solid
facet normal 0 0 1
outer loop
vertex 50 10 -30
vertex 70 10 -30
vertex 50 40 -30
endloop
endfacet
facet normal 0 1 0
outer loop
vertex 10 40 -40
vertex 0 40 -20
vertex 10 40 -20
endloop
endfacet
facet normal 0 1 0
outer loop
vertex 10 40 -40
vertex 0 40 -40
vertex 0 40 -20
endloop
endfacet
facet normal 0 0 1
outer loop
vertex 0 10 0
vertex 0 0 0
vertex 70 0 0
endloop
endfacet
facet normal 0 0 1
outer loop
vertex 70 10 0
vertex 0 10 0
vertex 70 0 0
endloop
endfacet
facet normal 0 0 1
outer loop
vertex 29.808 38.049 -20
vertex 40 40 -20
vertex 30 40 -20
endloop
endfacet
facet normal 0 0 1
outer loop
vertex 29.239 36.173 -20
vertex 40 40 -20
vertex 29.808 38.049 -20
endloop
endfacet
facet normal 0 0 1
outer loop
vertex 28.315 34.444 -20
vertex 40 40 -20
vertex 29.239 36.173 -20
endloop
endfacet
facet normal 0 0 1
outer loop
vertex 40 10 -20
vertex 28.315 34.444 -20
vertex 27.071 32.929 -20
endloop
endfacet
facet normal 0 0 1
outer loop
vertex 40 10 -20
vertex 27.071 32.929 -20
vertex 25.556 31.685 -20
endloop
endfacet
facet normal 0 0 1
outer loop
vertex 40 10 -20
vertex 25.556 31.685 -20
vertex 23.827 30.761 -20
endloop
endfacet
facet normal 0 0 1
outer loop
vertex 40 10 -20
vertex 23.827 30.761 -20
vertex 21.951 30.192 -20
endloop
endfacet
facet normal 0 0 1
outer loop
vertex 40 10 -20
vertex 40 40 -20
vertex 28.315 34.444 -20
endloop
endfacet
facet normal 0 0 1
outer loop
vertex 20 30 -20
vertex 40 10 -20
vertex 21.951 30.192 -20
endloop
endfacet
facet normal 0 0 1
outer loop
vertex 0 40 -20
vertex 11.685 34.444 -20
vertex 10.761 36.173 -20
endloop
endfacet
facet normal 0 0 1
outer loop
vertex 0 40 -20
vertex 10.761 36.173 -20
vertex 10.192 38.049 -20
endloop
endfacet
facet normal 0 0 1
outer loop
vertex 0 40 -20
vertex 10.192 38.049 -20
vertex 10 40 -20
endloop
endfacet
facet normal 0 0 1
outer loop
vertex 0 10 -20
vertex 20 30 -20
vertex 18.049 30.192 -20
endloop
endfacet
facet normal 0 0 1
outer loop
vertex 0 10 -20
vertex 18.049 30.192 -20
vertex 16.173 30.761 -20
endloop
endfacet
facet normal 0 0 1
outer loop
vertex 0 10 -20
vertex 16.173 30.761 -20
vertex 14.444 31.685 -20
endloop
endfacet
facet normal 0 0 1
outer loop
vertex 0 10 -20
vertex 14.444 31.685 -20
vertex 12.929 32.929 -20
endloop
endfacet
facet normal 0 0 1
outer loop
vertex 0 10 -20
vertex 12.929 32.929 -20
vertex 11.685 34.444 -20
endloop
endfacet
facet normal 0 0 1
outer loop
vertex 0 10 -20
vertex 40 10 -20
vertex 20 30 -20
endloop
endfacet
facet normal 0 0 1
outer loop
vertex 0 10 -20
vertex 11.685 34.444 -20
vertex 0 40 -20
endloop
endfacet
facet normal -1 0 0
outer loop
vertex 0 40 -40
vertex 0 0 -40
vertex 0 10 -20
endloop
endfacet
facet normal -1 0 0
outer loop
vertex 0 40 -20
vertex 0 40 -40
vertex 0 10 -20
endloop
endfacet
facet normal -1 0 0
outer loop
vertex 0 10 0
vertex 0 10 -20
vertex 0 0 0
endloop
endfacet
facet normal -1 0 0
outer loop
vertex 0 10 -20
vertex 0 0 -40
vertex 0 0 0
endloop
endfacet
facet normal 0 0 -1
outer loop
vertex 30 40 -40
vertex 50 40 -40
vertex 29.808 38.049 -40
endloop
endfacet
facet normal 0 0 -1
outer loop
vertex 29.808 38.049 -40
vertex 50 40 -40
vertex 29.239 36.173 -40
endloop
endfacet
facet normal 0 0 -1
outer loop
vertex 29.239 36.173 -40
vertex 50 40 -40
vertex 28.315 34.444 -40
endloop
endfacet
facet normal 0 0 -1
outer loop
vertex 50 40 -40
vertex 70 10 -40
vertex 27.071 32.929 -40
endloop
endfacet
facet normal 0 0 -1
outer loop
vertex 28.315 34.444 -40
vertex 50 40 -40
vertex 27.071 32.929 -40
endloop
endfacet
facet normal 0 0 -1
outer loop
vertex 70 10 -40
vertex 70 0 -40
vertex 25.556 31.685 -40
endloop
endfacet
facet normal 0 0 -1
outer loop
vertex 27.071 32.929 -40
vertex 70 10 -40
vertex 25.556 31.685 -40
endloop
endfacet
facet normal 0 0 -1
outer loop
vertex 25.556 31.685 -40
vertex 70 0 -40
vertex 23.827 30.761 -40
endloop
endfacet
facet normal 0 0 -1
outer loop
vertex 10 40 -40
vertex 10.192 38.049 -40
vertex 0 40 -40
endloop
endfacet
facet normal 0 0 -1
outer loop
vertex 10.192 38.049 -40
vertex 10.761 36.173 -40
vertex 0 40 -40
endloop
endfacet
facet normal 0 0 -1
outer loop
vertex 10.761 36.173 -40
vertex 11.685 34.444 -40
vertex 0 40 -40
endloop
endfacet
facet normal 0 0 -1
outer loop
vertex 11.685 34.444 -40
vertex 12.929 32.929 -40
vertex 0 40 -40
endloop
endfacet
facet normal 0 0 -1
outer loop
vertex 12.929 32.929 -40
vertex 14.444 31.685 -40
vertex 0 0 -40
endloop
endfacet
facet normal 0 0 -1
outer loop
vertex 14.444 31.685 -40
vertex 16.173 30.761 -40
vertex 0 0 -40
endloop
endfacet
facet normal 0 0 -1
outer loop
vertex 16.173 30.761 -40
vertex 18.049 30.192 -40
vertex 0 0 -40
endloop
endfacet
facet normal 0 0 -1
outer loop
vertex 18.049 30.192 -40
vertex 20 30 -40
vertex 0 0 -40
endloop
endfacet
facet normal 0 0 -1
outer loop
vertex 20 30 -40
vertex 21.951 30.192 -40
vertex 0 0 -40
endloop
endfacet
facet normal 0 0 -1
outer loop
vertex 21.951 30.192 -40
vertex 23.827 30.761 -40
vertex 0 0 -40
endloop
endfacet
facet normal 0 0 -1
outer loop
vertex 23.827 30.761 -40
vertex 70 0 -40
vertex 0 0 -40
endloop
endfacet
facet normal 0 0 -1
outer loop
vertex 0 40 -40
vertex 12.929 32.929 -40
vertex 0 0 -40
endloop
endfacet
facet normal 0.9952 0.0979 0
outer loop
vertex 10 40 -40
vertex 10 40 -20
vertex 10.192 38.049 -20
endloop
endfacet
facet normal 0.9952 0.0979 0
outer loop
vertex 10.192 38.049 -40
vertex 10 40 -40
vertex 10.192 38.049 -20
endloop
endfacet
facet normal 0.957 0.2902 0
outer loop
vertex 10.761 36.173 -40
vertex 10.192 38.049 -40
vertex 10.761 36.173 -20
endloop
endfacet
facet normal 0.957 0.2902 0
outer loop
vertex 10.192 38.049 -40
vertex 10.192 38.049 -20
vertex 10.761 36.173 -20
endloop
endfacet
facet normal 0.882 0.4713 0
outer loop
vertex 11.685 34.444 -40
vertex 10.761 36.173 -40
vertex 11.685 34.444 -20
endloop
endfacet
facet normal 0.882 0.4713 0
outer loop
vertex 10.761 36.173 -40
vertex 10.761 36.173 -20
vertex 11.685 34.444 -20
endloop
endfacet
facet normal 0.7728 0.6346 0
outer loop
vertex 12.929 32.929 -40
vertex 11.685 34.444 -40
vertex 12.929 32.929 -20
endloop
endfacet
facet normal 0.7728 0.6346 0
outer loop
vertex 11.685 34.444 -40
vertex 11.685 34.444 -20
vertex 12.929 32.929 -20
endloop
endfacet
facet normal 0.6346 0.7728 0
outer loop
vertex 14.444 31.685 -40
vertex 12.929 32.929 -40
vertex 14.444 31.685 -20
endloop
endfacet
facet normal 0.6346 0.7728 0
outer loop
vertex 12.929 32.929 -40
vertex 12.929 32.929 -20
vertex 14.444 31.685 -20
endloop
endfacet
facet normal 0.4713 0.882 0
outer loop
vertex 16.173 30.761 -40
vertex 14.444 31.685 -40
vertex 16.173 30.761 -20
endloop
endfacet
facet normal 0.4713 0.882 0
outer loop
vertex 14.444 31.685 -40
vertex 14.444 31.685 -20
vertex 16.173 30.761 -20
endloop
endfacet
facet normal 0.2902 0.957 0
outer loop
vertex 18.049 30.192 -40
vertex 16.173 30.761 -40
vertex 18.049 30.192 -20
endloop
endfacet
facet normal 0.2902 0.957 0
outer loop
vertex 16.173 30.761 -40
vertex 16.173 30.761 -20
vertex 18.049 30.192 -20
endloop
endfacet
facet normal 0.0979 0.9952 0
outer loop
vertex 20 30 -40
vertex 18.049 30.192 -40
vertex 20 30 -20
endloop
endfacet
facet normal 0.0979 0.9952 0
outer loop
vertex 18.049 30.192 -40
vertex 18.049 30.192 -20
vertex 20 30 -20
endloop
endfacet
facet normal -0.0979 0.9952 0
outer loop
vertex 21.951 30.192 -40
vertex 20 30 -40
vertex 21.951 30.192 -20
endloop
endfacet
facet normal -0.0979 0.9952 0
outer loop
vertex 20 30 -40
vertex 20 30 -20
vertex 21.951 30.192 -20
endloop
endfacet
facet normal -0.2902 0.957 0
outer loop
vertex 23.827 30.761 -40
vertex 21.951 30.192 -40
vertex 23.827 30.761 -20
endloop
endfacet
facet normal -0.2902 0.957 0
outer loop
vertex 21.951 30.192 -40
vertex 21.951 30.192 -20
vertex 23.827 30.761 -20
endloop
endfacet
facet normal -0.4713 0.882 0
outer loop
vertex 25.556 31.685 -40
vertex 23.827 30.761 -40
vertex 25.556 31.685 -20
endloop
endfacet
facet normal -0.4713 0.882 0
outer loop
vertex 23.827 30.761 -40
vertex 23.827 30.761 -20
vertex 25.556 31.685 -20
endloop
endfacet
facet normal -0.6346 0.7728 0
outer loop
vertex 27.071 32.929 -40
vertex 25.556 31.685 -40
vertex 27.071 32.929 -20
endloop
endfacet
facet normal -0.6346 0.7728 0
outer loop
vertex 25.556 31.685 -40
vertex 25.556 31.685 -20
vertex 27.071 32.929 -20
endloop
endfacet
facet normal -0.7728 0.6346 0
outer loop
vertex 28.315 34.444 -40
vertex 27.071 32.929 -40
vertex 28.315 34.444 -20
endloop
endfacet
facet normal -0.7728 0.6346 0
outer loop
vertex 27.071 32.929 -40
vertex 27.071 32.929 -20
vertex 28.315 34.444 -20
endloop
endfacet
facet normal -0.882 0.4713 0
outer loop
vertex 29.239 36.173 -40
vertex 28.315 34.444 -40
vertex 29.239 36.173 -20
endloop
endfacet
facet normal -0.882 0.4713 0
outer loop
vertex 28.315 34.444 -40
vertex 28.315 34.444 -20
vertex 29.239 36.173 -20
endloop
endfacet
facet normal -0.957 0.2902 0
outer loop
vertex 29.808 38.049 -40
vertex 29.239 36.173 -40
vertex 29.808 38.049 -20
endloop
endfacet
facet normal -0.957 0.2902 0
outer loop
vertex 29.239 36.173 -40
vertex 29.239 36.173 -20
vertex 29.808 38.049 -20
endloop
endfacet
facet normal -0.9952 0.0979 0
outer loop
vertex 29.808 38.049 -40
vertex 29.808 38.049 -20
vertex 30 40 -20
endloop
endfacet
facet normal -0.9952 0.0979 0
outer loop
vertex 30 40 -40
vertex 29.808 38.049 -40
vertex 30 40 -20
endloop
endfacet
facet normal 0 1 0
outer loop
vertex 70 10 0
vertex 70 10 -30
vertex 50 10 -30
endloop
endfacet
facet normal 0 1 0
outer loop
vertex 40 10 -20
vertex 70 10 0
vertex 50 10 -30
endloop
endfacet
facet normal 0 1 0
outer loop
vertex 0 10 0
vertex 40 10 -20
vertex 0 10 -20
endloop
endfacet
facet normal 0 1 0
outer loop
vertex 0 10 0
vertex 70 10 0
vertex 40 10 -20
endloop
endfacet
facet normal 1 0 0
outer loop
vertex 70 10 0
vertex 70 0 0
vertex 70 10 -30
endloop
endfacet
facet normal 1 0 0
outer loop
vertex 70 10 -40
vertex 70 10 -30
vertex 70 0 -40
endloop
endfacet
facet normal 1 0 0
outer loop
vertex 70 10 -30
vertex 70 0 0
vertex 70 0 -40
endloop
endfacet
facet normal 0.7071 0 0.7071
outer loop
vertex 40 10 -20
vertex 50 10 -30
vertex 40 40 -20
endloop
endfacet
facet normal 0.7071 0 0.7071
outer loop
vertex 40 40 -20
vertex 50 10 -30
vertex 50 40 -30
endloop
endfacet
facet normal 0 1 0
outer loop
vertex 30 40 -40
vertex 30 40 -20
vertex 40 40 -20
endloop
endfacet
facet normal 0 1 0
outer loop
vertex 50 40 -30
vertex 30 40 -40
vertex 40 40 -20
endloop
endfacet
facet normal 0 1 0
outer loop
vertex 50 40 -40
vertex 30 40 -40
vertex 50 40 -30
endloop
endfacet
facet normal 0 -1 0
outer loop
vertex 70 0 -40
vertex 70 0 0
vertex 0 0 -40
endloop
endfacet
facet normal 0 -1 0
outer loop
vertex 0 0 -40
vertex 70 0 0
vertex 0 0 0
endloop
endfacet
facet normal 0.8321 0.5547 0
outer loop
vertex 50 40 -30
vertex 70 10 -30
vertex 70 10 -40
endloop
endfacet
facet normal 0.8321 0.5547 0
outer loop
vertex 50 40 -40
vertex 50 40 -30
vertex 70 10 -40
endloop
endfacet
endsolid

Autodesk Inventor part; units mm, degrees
ref_plane "YZ Plane" through (0, 0, 0) normal (1, 0, 0) x (0, 1, 0)
ref_plane "XZ Plane" through (0, 0, 0) normal (0, 1, 0) x (-1, 0, 0)
ref_plane "XY Plane" through (0, 0, 0) normal (0, 0, 1) x (1, 0, 0)
sketch "草圖1" plane through (0, 0, 0) normal (0, 1, 0) x (-1, 0, 0)
  line L0 (0, 0) -> (-70, 0)
  line L1 (-70, 0) -> (-70, -40)
  line L2 (-70, -40) -> (0, -40)
  line L3 (0, -40) -> (0, 0)
  dimension "d0" = 40
  dimension "d1" = 70
extrude "擠出1" add sketch "草圖1" along normal blind 10
sketch "草圖2" plane through (0, 10, 0) normal (0, 1, 0) x (1, 0, 0)
  line L0 (0, 40) -> (0, 0) projected
  line L1 (0, 40) -> (40, 40)
  line L2 (40, 40) -> (40, 20)
  line L3 (40, 20) -> (0, 20)
  line L4 (0, 20) -> (0, 40)
  line L5 (40, 40) -> (70, 40)
  line L6 (70, 40) -> (70, 30)
  line L7 (70, 30) -> (40, 30)
  line L8 (40, 30) -> (40, 40)
  dimension "d4" = 30
  dimension "d5" = 40
  dimension "d6" = 20
  dimension "d7" = 10
extrude "擠出2" add sketch "草圖2" along normal blind 30
chamfer "倒角1" distance 10 angle 45 1 edges at (40, 25, -30)
chamfer "倒角2" distance 20 distance2 30 1 edges at (70, 40, -35) measured on face at (13.3333, 40, -26.6668)
sketch "草圖3" plane through (0, 10, -20) normal (0, 0, 1) x (1, 0, 0)
  line L0 (0, 30) -> (40, 30) projected
  circle A0 centre (20, 30) radius 10
  point P0 (0, -10)
  dimension "d16" = 20
extrude "擠出3" cut sketch "草圖3" against normal blind 30
properties part number "28"
